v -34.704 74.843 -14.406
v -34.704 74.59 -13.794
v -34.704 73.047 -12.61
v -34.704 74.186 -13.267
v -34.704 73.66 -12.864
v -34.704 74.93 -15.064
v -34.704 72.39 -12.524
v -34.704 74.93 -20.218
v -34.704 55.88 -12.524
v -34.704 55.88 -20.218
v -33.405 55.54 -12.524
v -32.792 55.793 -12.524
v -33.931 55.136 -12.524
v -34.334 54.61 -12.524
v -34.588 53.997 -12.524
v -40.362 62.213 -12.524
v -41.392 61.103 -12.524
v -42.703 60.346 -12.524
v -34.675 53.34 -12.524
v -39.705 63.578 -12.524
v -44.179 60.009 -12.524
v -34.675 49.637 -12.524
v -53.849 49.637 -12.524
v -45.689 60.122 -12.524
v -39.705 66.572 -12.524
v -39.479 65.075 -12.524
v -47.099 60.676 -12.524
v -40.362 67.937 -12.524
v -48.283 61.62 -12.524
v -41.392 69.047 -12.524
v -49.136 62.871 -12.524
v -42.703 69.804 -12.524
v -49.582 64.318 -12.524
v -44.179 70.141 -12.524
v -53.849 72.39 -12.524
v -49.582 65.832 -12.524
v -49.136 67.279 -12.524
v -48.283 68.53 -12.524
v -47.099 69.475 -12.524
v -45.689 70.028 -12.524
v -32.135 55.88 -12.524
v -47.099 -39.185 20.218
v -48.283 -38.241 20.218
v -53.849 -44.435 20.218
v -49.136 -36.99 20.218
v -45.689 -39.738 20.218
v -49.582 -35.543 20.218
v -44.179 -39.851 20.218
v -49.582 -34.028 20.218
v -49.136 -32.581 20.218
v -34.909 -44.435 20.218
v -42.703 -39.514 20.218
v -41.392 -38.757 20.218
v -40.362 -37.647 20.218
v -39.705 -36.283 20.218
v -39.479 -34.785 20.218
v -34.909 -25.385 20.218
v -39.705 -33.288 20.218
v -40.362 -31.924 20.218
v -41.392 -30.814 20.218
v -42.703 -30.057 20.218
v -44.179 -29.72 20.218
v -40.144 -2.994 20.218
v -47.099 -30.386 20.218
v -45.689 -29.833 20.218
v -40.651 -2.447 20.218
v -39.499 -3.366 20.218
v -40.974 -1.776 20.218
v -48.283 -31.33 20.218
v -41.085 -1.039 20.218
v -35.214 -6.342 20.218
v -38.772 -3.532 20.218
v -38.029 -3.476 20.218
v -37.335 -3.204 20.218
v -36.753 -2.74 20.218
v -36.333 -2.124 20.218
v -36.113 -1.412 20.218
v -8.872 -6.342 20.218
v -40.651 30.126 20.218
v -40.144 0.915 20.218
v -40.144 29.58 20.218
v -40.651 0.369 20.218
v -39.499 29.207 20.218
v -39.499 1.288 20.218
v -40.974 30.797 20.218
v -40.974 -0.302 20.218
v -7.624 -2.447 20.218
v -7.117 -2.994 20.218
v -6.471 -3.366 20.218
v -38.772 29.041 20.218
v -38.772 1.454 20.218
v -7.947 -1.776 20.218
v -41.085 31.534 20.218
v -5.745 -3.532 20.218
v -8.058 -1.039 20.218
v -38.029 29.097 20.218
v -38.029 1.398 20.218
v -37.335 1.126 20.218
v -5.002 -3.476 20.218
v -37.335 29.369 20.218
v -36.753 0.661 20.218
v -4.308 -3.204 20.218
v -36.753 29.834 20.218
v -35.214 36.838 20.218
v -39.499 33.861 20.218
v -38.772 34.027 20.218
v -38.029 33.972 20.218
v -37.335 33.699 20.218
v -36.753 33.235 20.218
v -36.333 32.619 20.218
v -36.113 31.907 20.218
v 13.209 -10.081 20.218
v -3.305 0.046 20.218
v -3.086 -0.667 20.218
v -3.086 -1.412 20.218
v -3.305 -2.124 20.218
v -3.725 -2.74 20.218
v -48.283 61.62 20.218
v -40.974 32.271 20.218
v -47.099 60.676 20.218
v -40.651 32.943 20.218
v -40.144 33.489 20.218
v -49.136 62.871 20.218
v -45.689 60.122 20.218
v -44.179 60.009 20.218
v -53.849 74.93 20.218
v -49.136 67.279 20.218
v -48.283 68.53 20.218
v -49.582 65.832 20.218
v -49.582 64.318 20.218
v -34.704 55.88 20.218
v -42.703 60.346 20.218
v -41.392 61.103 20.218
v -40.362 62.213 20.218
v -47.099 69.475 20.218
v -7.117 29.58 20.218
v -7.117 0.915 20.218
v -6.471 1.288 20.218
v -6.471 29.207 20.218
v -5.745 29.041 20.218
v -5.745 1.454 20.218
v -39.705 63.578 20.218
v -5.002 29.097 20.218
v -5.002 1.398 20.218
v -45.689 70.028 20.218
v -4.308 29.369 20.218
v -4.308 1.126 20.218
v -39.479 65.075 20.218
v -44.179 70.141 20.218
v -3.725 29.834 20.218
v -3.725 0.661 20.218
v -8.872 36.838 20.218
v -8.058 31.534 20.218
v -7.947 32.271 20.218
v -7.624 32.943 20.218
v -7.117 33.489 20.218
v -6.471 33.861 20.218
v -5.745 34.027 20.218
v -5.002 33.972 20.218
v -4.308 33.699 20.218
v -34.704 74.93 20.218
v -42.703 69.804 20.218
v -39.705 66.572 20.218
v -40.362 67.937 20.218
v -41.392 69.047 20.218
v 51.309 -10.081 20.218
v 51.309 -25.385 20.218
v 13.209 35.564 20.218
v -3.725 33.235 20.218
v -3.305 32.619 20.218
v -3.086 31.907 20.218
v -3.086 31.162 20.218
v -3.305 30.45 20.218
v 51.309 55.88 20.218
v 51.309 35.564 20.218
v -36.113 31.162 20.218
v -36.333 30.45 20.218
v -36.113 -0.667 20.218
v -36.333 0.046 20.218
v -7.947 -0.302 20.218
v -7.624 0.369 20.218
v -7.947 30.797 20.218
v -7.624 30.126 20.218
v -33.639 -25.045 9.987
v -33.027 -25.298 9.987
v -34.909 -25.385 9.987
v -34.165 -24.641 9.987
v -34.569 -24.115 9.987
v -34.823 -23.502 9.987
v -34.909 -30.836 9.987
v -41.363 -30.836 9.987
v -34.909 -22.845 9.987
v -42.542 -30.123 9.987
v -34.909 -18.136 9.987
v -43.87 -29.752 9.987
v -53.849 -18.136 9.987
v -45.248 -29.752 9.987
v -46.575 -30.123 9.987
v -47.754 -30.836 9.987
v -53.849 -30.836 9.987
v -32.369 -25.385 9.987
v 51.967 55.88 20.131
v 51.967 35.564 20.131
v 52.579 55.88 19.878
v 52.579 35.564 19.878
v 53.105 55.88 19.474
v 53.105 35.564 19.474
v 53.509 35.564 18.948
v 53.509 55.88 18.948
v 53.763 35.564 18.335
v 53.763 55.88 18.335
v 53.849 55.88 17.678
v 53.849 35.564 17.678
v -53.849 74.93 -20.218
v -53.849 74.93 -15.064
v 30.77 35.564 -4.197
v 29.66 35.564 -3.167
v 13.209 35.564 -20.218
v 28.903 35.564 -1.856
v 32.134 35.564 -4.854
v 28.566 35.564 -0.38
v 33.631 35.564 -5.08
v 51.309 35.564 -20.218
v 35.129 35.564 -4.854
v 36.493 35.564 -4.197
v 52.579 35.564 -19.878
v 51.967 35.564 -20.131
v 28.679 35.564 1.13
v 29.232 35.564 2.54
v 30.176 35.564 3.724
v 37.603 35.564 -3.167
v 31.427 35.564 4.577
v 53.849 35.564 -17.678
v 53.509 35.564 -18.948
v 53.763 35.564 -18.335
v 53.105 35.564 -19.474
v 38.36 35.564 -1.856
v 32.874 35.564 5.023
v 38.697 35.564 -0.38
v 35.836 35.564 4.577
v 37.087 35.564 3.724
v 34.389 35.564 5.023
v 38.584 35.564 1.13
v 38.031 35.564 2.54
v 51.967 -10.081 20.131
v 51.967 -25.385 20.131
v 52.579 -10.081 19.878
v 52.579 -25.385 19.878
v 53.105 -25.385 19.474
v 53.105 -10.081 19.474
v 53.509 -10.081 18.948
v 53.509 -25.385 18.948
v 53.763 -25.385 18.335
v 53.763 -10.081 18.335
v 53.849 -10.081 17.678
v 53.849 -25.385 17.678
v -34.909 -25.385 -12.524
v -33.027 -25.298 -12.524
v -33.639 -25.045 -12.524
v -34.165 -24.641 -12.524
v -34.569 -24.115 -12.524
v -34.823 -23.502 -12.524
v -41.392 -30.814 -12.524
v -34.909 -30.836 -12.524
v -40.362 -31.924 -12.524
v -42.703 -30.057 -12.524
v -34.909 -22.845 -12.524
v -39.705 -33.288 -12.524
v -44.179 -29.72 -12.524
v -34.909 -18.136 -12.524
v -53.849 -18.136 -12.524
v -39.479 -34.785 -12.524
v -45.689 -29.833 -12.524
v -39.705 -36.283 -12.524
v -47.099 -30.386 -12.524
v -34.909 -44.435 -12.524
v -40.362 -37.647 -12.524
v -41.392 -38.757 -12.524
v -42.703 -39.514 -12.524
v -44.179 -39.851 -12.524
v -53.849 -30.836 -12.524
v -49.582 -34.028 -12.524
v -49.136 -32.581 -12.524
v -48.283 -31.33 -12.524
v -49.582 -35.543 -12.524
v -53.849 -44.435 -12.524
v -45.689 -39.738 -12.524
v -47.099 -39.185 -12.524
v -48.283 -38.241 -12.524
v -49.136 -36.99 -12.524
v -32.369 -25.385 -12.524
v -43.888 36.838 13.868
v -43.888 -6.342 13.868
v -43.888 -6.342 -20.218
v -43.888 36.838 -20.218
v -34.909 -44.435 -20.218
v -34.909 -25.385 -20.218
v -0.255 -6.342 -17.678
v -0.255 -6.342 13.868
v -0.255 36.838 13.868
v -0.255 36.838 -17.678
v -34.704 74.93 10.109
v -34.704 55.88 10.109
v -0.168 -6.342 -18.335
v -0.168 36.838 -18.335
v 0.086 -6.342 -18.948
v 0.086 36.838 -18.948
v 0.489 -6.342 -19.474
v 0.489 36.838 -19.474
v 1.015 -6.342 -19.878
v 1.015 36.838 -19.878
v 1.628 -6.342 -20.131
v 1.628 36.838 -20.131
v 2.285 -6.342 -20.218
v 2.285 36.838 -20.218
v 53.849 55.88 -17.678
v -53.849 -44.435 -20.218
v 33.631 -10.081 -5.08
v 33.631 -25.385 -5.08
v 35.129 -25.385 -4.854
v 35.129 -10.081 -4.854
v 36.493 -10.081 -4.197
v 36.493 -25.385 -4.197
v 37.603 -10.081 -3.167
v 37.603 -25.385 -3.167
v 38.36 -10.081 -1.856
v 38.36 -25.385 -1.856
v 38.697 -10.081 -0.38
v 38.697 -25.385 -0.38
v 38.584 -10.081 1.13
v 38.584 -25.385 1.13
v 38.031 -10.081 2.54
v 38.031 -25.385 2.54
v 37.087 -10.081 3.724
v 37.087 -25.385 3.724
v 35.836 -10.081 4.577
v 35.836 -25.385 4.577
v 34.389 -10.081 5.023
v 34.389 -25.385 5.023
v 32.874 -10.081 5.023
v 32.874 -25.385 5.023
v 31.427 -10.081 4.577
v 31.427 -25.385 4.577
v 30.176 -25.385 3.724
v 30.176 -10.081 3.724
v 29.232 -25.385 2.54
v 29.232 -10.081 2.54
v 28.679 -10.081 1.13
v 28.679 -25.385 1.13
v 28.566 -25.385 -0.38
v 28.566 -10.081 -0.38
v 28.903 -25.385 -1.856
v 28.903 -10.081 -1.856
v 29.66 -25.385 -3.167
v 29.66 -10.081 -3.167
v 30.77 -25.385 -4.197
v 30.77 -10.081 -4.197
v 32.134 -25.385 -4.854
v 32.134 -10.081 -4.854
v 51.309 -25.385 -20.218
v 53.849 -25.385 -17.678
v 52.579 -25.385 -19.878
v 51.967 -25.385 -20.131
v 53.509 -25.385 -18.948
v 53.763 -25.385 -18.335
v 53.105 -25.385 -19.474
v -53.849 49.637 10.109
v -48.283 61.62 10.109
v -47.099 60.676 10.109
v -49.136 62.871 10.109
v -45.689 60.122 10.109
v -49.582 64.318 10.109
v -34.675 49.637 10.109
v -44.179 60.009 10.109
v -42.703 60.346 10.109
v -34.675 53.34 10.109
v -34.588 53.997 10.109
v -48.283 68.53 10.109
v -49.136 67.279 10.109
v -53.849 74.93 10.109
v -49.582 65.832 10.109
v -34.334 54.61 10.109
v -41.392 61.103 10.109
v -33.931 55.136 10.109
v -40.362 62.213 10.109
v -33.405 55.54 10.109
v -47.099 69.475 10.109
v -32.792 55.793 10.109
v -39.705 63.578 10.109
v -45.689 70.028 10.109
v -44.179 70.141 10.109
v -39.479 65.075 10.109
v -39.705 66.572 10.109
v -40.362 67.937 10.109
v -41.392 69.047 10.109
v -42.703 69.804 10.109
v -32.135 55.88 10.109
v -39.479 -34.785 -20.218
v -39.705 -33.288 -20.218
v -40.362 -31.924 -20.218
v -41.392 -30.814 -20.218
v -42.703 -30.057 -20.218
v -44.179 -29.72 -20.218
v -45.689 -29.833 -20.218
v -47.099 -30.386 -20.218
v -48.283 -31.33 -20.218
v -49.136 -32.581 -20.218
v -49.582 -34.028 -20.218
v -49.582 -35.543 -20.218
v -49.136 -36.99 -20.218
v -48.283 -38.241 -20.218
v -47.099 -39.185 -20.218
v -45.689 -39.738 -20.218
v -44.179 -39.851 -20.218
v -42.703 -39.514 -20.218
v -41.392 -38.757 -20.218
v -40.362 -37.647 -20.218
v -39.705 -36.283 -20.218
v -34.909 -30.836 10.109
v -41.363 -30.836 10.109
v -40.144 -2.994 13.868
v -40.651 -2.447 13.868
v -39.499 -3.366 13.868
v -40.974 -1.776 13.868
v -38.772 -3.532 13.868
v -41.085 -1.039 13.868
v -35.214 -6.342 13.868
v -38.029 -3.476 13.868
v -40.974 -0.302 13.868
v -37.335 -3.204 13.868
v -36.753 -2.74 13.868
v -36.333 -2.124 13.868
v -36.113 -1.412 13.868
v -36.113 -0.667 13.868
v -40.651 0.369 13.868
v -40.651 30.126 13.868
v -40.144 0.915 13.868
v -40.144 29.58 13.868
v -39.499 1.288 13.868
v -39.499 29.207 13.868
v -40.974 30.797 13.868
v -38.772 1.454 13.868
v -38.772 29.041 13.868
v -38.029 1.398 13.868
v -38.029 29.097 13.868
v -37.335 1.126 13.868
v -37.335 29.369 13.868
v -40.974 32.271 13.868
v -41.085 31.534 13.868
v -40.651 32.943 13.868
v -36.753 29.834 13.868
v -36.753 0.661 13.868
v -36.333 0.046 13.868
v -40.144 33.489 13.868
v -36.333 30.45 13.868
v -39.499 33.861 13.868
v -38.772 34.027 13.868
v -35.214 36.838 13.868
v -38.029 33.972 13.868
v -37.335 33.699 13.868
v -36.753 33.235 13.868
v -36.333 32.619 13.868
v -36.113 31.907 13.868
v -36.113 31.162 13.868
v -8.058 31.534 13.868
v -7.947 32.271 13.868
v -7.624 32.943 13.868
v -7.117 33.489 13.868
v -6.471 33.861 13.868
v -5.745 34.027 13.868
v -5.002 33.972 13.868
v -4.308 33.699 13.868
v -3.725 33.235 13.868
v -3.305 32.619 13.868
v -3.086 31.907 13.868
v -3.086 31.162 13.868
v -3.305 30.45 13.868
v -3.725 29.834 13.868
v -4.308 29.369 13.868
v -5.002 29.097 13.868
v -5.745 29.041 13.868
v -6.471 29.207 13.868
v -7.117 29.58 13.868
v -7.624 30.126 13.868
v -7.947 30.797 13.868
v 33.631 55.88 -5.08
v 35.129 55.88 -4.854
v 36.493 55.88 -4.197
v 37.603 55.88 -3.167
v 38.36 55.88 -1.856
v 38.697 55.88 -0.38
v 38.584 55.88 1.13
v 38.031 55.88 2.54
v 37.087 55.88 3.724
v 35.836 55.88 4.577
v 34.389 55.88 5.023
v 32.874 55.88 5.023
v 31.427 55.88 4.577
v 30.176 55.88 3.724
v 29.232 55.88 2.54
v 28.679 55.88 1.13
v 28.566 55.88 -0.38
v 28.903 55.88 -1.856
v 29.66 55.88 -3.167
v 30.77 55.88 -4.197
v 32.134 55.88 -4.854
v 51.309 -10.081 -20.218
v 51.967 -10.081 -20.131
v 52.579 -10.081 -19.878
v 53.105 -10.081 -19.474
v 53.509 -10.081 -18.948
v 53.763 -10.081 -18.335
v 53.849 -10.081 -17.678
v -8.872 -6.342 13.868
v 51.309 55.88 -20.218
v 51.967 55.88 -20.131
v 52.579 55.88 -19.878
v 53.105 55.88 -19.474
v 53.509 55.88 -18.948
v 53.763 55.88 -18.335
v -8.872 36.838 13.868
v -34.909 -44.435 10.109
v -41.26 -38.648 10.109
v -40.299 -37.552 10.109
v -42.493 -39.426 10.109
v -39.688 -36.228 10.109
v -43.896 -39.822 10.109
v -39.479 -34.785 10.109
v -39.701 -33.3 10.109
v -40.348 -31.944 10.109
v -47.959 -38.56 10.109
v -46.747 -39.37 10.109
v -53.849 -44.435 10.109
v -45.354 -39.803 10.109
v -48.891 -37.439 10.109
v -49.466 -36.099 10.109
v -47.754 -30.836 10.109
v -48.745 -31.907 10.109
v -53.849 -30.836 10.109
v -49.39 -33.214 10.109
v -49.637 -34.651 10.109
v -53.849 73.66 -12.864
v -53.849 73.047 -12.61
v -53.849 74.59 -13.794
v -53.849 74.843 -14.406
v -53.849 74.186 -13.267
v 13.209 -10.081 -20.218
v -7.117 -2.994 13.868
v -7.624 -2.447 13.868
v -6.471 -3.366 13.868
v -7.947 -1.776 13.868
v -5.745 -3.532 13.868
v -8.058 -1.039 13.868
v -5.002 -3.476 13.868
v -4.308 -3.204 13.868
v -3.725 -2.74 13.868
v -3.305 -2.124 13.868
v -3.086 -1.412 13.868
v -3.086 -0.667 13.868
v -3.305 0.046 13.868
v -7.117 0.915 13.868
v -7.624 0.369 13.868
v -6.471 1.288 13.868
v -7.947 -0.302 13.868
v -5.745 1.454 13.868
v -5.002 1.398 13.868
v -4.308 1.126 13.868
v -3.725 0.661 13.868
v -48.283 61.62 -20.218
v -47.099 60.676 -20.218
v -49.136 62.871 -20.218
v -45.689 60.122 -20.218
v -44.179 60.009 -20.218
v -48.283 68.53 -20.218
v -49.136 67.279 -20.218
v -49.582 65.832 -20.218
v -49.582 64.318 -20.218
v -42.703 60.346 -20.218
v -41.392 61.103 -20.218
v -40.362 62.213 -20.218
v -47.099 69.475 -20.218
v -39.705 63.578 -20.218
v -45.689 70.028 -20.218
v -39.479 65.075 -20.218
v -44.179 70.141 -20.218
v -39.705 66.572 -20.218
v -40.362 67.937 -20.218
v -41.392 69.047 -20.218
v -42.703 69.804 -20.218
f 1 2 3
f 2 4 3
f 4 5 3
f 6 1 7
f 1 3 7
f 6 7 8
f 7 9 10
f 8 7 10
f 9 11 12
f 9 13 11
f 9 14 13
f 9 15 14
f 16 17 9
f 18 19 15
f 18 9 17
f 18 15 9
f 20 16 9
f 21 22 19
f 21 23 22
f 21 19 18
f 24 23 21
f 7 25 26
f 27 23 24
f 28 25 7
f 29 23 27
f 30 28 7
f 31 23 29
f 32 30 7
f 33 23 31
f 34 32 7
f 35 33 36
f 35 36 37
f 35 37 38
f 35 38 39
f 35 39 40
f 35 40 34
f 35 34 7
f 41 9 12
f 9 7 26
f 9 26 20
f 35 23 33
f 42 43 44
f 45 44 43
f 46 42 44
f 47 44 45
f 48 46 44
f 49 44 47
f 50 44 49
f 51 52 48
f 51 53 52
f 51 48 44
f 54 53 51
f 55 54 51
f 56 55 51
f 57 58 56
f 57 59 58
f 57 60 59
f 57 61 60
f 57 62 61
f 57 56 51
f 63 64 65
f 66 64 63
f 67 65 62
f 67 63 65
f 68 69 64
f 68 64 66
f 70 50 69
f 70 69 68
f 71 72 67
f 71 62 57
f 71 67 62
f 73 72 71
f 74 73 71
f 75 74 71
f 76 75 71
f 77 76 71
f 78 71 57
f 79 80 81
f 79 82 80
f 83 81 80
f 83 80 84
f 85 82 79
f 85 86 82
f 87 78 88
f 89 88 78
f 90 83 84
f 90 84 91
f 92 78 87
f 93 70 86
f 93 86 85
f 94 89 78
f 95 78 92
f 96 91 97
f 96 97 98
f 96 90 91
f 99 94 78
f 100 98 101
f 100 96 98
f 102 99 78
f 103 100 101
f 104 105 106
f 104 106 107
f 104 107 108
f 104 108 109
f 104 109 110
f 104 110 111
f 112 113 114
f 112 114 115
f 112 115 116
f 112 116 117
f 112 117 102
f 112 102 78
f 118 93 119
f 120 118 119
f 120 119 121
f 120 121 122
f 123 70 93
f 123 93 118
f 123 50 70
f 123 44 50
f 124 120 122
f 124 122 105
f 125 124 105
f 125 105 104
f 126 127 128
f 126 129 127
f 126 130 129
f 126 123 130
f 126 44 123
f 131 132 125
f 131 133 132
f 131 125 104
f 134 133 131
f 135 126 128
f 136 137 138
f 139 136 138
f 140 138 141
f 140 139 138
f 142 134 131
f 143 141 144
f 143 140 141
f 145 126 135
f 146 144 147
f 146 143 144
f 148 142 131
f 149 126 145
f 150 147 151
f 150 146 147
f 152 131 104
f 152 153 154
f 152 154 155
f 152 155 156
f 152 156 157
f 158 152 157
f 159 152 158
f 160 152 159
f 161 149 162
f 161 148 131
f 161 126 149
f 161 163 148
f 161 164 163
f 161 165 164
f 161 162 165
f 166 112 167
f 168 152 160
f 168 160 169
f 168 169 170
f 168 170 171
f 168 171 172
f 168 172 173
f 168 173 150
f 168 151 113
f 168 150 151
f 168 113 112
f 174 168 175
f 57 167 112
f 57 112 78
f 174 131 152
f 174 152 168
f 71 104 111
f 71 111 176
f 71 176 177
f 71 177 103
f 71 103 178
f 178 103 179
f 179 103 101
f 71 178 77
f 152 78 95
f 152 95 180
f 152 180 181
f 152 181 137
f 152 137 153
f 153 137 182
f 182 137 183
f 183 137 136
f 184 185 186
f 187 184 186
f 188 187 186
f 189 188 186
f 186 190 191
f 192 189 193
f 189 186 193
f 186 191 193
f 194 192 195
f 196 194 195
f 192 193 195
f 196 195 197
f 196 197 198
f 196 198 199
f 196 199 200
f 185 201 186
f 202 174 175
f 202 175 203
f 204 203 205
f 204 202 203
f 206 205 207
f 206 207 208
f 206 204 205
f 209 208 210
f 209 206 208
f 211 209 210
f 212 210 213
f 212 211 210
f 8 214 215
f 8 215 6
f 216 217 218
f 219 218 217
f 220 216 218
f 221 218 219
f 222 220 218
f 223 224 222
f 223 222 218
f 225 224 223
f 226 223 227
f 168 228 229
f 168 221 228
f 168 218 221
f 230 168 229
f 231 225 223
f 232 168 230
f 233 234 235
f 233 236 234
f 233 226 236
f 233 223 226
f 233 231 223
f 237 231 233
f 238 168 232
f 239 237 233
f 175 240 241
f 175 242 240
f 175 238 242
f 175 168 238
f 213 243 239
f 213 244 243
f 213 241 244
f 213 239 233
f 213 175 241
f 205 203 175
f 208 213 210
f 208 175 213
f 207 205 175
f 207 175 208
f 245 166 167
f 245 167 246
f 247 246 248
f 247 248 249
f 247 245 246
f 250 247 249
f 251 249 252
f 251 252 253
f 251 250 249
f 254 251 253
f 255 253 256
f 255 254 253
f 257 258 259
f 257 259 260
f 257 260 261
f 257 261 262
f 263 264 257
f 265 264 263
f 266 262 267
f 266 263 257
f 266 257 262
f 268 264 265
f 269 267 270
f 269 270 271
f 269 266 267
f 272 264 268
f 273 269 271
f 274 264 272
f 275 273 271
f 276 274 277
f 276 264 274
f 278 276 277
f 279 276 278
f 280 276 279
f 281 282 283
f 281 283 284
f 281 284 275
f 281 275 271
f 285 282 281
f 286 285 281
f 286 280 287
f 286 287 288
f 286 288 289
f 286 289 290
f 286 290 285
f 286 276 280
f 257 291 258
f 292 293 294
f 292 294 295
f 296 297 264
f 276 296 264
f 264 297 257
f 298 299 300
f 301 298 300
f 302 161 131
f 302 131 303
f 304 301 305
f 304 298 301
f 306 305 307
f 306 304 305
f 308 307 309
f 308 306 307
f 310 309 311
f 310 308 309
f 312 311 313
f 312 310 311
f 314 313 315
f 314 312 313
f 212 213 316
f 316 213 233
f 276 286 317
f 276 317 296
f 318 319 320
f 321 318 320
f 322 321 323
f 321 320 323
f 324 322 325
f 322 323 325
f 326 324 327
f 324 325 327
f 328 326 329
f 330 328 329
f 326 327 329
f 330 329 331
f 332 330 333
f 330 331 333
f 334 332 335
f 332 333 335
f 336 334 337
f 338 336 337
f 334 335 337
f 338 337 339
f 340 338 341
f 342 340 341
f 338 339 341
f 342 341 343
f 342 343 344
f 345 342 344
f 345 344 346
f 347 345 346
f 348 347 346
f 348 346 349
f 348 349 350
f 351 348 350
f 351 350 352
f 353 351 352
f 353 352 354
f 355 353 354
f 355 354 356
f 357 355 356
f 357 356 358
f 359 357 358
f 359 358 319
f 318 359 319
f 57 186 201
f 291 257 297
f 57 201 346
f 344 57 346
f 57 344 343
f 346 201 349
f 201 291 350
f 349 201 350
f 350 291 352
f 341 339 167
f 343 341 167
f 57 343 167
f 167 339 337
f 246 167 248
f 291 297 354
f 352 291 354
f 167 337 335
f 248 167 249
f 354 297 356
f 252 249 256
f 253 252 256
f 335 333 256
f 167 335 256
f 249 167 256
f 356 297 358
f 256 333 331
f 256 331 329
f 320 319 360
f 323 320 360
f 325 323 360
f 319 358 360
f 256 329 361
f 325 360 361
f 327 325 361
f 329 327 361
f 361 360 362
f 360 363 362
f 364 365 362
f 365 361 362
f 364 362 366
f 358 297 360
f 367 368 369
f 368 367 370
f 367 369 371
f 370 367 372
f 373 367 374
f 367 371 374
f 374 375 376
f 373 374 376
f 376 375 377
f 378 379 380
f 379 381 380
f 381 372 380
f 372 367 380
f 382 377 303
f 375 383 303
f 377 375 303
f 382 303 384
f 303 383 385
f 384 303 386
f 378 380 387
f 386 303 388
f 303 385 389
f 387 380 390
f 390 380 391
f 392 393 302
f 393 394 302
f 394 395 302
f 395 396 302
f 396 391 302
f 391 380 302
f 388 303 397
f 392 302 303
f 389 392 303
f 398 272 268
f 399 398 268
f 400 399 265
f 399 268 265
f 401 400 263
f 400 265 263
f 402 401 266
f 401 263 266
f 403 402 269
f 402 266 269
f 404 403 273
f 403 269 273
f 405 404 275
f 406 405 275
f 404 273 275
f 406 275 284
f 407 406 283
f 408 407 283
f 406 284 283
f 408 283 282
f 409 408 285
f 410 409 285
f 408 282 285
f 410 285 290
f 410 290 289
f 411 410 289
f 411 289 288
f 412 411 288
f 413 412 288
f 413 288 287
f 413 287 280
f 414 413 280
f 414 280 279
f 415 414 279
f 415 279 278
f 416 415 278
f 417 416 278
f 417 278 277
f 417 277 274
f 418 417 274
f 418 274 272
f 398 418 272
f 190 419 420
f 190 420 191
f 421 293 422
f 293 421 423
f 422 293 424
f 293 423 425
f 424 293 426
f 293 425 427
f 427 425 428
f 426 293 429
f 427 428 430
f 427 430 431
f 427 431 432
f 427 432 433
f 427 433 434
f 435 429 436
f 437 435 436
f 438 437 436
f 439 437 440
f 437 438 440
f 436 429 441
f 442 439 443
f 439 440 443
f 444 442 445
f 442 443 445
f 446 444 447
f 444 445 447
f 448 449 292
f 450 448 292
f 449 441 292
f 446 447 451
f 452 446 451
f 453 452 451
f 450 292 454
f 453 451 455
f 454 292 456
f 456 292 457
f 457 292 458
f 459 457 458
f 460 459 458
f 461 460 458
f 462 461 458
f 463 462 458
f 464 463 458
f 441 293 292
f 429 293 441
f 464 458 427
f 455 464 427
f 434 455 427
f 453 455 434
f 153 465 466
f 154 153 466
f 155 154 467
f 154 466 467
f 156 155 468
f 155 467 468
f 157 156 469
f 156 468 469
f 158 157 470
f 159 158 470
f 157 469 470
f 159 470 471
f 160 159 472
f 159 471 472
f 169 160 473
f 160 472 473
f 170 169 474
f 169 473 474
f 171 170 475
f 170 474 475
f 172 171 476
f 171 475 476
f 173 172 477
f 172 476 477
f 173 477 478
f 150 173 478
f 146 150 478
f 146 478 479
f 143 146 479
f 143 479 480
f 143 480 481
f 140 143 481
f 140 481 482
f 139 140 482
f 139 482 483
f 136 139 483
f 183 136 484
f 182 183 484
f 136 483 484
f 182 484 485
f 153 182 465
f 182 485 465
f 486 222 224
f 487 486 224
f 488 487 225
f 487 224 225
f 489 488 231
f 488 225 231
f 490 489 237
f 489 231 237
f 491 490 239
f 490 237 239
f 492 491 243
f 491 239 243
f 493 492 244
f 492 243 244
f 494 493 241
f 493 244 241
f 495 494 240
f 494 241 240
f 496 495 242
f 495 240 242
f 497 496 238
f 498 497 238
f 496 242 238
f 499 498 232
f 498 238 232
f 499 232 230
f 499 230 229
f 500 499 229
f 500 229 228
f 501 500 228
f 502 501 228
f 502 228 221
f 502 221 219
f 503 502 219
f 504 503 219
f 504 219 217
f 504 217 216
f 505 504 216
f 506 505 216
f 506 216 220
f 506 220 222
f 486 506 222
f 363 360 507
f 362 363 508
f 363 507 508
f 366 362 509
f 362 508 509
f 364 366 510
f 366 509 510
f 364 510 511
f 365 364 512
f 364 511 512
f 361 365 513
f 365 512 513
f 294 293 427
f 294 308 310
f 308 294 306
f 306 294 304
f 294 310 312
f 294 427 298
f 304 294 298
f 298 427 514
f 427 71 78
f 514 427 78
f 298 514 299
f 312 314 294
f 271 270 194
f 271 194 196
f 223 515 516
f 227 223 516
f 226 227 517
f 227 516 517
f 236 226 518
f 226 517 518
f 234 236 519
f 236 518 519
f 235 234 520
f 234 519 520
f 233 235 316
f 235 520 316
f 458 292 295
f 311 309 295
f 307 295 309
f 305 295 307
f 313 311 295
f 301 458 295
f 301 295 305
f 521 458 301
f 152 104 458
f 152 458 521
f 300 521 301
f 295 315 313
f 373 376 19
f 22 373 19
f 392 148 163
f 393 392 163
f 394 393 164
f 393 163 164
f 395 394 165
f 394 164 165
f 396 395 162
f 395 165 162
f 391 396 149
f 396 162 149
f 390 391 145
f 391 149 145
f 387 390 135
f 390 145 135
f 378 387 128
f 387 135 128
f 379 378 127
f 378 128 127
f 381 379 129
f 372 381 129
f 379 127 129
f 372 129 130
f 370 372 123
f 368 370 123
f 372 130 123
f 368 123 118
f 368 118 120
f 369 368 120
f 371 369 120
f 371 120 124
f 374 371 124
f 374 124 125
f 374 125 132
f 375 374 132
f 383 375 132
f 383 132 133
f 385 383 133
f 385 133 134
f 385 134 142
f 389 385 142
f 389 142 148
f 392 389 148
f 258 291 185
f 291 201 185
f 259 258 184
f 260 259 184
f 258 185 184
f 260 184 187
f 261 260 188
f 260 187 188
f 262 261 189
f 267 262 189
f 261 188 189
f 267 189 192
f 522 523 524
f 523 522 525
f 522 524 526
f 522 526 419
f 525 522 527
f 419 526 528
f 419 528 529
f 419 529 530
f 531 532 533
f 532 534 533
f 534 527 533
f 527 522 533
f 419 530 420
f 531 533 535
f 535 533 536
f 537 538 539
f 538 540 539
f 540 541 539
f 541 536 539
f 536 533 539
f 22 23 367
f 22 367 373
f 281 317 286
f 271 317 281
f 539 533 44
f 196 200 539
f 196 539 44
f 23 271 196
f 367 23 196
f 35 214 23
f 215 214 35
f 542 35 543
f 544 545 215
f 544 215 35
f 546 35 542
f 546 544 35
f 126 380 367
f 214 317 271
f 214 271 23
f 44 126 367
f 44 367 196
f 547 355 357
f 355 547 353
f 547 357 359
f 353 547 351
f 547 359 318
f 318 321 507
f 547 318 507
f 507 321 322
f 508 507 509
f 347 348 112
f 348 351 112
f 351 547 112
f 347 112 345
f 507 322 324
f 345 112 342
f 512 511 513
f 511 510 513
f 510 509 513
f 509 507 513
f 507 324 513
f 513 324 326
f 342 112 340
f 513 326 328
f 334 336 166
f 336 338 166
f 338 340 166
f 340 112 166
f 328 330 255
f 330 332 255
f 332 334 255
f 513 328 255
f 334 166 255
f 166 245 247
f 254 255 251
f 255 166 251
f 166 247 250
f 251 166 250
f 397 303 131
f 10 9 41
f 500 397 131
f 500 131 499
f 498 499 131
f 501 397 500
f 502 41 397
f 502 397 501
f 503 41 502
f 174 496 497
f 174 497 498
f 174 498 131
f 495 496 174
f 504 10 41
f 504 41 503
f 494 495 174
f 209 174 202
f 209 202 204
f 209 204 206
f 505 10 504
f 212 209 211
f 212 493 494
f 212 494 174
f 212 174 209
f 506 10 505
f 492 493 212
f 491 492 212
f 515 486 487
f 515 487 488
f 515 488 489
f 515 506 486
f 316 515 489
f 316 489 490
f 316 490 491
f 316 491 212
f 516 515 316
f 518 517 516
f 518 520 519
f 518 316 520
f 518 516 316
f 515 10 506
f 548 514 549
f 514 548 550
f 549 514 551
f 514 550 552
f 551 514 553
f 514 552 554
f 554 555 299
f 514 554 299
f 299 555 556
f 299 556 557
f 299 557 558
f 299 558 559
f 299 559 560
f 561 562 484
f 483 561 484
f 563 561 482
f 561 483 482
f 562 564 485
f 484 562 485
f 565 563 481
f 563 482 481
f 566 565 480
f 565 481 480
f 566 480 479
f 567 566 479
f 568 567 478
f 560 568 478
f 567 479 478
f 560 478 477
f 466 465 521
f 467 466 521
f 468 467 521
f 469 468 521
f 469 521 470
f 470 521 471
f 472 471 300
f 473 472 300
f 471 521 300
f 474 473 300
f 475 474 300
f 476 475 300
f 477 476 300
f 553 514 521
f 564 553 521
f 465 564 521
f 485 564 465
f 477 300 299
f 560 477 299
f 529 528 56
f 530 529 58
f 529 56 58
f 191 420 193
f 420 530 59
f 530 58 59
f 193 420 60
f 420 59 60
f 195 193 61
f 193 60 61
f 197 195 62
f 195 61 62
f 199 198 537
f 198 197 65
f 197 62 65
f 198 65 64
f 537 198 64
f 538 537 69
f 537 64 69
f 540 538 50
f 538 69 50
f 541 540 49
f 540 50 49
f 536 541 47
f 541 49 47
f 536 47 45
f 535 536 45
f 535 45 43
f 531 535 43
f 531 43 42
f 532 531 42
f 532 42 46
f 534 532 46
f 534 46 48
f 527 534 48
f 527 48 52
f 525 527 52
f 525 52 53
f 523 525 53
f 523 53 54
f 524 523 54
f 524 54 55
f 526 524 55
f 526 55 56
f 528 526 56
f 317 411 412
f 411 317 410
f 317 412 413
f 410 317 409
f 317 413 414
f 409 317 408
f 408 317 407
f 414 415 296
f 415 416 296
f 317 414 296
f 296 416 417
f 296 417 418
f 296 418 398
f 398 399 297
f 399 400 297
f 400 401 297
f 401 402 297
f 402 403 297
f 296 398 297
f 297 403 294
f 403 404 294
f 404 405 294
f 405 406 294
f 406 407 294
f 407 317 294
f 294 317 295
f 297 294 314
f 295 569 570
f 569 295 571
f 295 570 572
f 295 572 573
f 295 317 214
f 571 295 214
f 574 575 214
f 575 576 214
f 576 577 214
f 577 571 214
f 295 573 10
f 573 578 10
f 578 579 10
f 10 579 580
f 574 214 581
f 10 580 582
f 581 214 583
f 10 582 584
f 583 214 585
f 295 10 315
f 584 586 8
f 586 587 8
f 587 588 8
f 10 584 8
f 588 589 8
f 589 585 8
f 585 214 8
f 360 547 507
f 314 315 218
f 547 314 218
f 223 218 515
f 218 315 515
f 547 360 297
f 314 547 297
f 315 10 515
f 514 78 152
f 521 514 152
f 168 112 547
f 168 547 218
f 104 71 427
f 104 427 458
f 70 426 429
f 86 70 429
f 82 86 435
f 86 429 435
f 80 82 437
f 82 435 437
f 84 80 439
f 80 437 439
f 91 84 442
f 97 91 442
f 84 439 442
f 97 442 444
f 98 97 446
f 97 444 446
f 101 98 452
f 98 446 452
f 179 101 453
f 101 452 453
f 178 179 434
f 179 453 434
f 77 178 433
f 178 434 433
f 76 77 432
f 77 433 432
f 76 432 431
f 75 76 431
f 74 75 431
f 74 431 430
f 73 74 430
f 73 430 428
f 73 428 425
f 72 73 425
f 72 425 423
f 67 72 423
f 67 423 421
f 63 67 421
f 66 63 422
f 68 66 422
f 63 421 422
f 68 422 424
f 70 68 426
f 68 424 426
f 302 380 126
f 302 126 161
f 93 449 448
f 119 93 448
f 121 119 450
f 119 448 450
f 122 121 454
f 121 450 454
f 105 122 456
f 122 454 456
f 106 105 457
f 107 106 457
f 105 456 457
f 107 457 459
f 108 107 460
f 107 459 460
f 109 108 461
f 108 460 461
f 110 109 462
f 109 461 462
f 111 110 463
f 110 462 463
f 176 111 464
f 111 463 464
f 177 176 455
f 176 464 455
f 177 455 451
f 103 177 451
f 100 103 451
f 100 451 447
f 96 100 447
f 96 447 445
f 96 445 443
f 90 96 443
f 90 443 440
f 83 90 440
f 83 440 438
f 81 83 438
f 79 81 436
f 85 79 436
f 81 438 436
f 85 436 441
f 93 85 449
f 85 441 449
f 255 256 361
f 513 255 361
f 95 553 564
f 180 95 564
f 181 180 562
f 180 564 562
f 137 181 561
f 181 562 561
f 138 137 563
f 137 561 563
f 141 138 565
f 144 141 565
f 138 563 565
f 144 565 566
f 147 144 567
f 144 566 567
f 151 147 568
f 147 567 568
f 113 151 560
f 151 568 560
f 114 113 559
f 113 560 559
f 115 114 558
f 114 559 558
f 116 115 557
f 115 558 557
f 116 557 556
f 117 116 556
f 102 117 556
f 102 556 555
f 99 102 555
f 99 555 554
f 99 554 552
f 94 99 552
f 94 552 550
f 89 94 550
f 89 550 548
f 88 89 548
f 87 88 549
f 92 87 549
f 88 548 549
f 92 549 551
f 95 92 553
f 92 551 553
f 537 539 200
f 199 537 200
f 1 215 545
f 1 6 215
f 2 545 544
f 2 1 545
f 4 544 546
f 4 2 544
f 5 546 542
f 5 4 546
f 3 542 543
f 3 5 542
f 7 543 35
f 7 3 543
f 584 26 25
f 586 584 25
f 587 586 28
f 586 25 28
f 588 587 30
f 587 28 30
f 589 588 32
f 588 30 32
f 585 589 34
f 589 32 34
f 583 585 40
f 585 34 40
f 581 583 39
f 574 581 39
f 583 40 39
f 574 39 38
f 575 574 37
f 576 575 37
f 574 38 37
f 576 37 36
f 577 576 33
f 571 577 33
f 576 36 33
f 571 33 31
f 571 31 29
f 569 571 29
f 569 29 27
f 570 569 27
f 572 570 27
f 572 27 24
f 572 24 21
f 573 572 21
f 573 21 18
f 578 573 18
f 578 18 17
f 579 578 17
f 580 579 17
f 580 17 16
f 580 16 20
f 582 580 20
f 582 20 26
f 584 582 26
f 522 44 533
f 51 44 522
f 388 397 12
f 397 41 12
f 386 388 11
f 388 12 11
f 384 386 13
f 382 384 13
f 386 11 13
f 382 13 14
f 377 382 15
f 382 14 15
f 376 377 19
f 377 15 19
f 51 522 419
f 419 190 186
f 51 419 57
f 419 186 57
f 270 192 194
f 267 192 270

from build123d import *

# Parameters (mm, degrees)
BOSS_EXTRUDE1_DEPTH      = 55.88
BOSS_EXTRUDE1_DEPTH_BACK = 25.384918905
SKETCH1_W                = 107.698417182
SKETCH1_H                = 40.435670154
SKETCH7_W                = 43.633869471
SKETCH7_H                = 43.18
CUT_EXTRUDE8_DEPTH       = 88.506314553
SKETCH11_R               = 5.08
CUT_EXTRUDE9_DEPTH       = 100.561464261
FILLET2_R                = 2.54
SKETCH13_W               = 44.238094174
SKETCH13_H               = 45.644522424
CUT_EXTRUDE12_DEPTH      = 88.506314553
SKETCH16_W               = 19.145212778
SKETCH16_H               = 40.435670154
BOSS_EXTRUDE3_DEPTH      = 19.05
SKETCH17_W               = 18.93986558
SKETCH17_H               = 40.435670154
BOSS_EXTRUDE4_DEPTH      = 19.05
SKETCH18_R               = 5.08
CUT_EXTRUDE14_DEPTH      = 101.743662762
SKETCH19_W               = 12.523537134
SKETCH19_H               = 13.59850093
SKETCH19_W_2             = 10.108917538
SKETCH19_H_2             = 12.59254748
CUT_EXTRUDE15_DEPTH      = 19.05
SKETCH20_W               = 18.93986558
SKETCH20_H               = 22.510158117
CUT_EXTRUDE16_DEPTH      = 12.7
SKETCH23_W               = 22.632454672
SKETCH23_H               = 12.59254748
CUT_EXTRUDE19_DEPTH      = 12.7
SKETCH24_W               = 19.174620912
SKETCH24_H               = 22.632454672
CUT_EXTRUDE20_DEPTH      = 12.7
FILLET4_R                = 2.54
FILLET5_R                = 2.54
SKETCH25_W               = 8.617694519
SKETCH25_H               = 43.18
BOSS_EXTRUDE5_DEPTH      = 6.35
SKETCH26_W               = 8.674470407
SKETCH26_H               = 43.18
BOSS_EXTRUDE6_DEPTH      = 6.35
SKETCH27_R               = 2.5
CUT_EXTRUDE21_DEPTH      = 6.35
SKETCH22_W               = 22.632454672
SKETCH22_H               = 12.59254748
CUT_EXTRUDE18_DEPTH      = 12.7


with BuildPart() as part:
    # Sketch1 → Boss-Extrude1 (new, two sides: drawn at the far end of the back side and taken through both)
    with BuildSketch(Plane(origin=(0, 0, 0), x_dir=(1, 0, 0), z_dir=(0, 1, 0)).offset(-BOSS_EXTRUDE1_DEPTH_BACK)):
        Rectangle(SKETCH1_W, SKETCH1_H)
    extrude(amount=BOSS_EXTRUDE1_DEPTH + BOSS_EXTRUDE1_DEPTH_BACK)

    # Sketch7 → Cut-Extrude8 (cut, through all)
    with BuildSketch(Plane.XY.offset(20.217835077)):
        with Locations((-22.071539031, 15.247540547)):
            Rectangle(SKETCH7_W, SKETCH7_H)
    extrude(amount=-CUT_EXTRUDE8_DEPTH, mode=Mode.SUBTRACT)

    # Sketch11 → Cut-Extrude9 (cut, through all)
    with BuildSketch(Plane(origin=(0, -25.384918905, 0), x_dir=(-1, 0, 0), z_dir=(0, -1, 0))):
        with Locations(Location((-33.631373514, 0, 0), (0, 0, 90))):
            Circle(SKETCH11_R)
    extrude(amount=-CUT_EXTRUDE9_DEPTH, mode=Mode.SUBTRACT)

    # Fillet2
    fillet2_edges = [part.edges().sort_by_distance(p)[0] for p in [
        (53.849208591, 15.247540547, 20.217835077),
        (53.849208591, 15.247540547, -20.217835077),
    ]]
    fillet(fillet2_edges, radius=FILLET2_R)

    # Sketch13 → Cut-Extrude12 (cut, through all)
    with BuildSketch(Plane.XY.offset(20.217835077)):
        with Locations((35.328255678, 12.741509062)):
            Rectangle(SKETCH13_W, SKETCH13_H)
    extrude(amount=-CUT_EXTRUDE12_DEPTH, mode=Mode.SUBTRACT)

    # Sketch16 → Boss-Extrude3 (add)
    with BuildSketch(Plane(origin=(0, 55.88, 0), x_dir=(1, 0, 0), z_dir=(0, 1, 0))):
        with Locations((-44.276602202, 0)):
            Rectangle(SKETCH16_W, SKETCH16_H)
    extrude(amount=BOSS_EXTRUDE3_DEPTH)

    # Sketch17 → Boss-Extrude4 (add)
    with BuildSketch(Plane.XZ.offset(25.384918905)):
        with Locations((-44.379275801, 0)):
            Rectangle(SKETCH17_W, SKETCH17_H)
    extrude(amount=BOSS_EXTRUDE4_DEPTH)

    # Sketch18 → Cut-Extrude14 (cut, through all)
    with BuildSketch(Plane.XY.offset(20.217835077)):
        with Locations((-44.558869733, 65.07512608)):
            Circle(SKETCH18_R)
        with Locations((-44.558869733, -34.785392183)):
            Circle(SKETCH18_R)
    extrude(amount=-CUT_EXTRUDE14_DEPTH, mode=Mode.SUBTRACT)

    # Sketch19 → Cut-Extrude15 (cut)
    with BuildSketch(Plane.ZY.offset(53.849208591)):
        with Locations((-6.261768567, -37.63566844)):
            Rectangle(SKETCH19_W, SKETCH19_H)
        with Locations((5.054458769, -37.63566844)):
            Rectangle(SKETCH19_W_2, SKETCH19_H)
        with Locations((-6.261768567, 68.63372626)):
            Rectangle(SKETCH19_W, SKETCH19_H_2)
        with Locations((5.054458769, 68.63372626)):
            Rectangle(SKETCH19_W_2, SKETCH19_H_2)
    extrude(amount=-CUT_EXTRUDE15_DEPTH, mode=Mode.SUBTRACT)

    # Sketch20 → Cut-Extrude16 (cut)
    with BuildSketch(Plane(origin=(0, -30.836417975, 0), x_dir=(-1, 0, 0), z_dir=(0, -1, 0))):
        with Locations((44.379275801, 1.268458076)):
            Rectangle(SKETCH20_W, SKETCH20_H)
    extrude(amount=-CUT_EXTRUDE16_DEPTH, mode=Mode.SUBTRACT)

    # Sketch23 → Cut-Extrude19 (cut)
    with BuildSketch(Plane.ZY.offset(34.799208591)):
        with Locations((-1.207309798, 68.63372626)):
            Rectangle(SKETCH23_W, SKETCH23_H)
    extrude(amount=-CUT_EXTRUDE19_DEPTH, mode=Mode.SUBTRACT)

    # Sketch24 → Cut-Extrude20 (cut)
    with BuildSketch(Plane(origin=(0, 62.33745252, 0), x_dir=(1, 0, 0), z_dir=(0, 1, 0))):
        with Locations((-44.261898135, 1.207309798)):
            Rectangle(SKETCH24_W, SKETCH24_H)
    extrude(amount=-CUT_EXTRUDE20_DEPTH, mode=Mode.SUBTRACT)

    # Fillet4
    fillet4_edges = [part.edges().sort_by_distance(p)[0] for p in [
        (-44.276602202, 74.93, -12.523537134),
        (-0.254604295, 15.247540547, -20.217835077),
    ]]
    fillet(fillet4_edges, radius=FILLET4_R)

    # Fillet5
    fillet5_edges = [part.edges().sort_by_distance(p)[0] for p in [
        (-34.909343011, -25.384918905, -1.268458075),
        (-34.674587679, 55.88, -1.207309798),
    ]]
    fillet(fillet5_edges, radius=FILLET5_R)

    # Sketch25 → Boss-Extrude5 (add)
    with BuildSketch(Plane.XY.offset(20.217835077)):
        with Locations((-4.563451555, 15.247540547)):
            Rectangle(SKETCH25_W, SKETCH25_H)
    extrude(amount=-BOSS_EXTRUDE5_DEPTH)

    # Sketch26 → Boss-Extrude6 (add)
    with BuildSketch(Plane.XY.offset(20.217835077)):
        with Locations((-39.551238563, 15.247540547)):
            Rectangle(SKETCH26_W, SKETCH26_H)
    extrude(amount=-BOSS_EXTRUDE6_DEPTH)

    # Sketch27 → Cut-Extrude21 (cut)
    with BuildSketch(Plane(origin=(0, 0, 13.867835077), x_dir=(-1, 0, 0), z_dir=(0, 0, -1))):
        with Locations((5.557905154, -1.039158594)):
            Circle(SKETCH27_R)
        with Locations((5.557905154, 31.534239688)):
            Circle(SKETCH27_R)
        with Locations((38.585172907, -1.039158594)):
            Circle(SKETCH27_R)
        with Locations((38.585172907, 31.534239688)):
            Circle(SKETCH27_R)
    extrude(amount=-CUT_EXTRUDE21_DEPTH, mode=Mode.SUBTRACT)

    # Sketch22 → Cut-Extrude18 (cut)
    with BuildSketch(Plane.ZY.offset(34.799208591)):
        with Locations((-1.207309798, 68.63372626)):
            Rectangle(SKETCH22_W, SKETCH22_H)
    extrude(amount=-CUT_EXTRUDE18_DEPTH, mode=Mode.SUBTRACT)


solid = part.part
